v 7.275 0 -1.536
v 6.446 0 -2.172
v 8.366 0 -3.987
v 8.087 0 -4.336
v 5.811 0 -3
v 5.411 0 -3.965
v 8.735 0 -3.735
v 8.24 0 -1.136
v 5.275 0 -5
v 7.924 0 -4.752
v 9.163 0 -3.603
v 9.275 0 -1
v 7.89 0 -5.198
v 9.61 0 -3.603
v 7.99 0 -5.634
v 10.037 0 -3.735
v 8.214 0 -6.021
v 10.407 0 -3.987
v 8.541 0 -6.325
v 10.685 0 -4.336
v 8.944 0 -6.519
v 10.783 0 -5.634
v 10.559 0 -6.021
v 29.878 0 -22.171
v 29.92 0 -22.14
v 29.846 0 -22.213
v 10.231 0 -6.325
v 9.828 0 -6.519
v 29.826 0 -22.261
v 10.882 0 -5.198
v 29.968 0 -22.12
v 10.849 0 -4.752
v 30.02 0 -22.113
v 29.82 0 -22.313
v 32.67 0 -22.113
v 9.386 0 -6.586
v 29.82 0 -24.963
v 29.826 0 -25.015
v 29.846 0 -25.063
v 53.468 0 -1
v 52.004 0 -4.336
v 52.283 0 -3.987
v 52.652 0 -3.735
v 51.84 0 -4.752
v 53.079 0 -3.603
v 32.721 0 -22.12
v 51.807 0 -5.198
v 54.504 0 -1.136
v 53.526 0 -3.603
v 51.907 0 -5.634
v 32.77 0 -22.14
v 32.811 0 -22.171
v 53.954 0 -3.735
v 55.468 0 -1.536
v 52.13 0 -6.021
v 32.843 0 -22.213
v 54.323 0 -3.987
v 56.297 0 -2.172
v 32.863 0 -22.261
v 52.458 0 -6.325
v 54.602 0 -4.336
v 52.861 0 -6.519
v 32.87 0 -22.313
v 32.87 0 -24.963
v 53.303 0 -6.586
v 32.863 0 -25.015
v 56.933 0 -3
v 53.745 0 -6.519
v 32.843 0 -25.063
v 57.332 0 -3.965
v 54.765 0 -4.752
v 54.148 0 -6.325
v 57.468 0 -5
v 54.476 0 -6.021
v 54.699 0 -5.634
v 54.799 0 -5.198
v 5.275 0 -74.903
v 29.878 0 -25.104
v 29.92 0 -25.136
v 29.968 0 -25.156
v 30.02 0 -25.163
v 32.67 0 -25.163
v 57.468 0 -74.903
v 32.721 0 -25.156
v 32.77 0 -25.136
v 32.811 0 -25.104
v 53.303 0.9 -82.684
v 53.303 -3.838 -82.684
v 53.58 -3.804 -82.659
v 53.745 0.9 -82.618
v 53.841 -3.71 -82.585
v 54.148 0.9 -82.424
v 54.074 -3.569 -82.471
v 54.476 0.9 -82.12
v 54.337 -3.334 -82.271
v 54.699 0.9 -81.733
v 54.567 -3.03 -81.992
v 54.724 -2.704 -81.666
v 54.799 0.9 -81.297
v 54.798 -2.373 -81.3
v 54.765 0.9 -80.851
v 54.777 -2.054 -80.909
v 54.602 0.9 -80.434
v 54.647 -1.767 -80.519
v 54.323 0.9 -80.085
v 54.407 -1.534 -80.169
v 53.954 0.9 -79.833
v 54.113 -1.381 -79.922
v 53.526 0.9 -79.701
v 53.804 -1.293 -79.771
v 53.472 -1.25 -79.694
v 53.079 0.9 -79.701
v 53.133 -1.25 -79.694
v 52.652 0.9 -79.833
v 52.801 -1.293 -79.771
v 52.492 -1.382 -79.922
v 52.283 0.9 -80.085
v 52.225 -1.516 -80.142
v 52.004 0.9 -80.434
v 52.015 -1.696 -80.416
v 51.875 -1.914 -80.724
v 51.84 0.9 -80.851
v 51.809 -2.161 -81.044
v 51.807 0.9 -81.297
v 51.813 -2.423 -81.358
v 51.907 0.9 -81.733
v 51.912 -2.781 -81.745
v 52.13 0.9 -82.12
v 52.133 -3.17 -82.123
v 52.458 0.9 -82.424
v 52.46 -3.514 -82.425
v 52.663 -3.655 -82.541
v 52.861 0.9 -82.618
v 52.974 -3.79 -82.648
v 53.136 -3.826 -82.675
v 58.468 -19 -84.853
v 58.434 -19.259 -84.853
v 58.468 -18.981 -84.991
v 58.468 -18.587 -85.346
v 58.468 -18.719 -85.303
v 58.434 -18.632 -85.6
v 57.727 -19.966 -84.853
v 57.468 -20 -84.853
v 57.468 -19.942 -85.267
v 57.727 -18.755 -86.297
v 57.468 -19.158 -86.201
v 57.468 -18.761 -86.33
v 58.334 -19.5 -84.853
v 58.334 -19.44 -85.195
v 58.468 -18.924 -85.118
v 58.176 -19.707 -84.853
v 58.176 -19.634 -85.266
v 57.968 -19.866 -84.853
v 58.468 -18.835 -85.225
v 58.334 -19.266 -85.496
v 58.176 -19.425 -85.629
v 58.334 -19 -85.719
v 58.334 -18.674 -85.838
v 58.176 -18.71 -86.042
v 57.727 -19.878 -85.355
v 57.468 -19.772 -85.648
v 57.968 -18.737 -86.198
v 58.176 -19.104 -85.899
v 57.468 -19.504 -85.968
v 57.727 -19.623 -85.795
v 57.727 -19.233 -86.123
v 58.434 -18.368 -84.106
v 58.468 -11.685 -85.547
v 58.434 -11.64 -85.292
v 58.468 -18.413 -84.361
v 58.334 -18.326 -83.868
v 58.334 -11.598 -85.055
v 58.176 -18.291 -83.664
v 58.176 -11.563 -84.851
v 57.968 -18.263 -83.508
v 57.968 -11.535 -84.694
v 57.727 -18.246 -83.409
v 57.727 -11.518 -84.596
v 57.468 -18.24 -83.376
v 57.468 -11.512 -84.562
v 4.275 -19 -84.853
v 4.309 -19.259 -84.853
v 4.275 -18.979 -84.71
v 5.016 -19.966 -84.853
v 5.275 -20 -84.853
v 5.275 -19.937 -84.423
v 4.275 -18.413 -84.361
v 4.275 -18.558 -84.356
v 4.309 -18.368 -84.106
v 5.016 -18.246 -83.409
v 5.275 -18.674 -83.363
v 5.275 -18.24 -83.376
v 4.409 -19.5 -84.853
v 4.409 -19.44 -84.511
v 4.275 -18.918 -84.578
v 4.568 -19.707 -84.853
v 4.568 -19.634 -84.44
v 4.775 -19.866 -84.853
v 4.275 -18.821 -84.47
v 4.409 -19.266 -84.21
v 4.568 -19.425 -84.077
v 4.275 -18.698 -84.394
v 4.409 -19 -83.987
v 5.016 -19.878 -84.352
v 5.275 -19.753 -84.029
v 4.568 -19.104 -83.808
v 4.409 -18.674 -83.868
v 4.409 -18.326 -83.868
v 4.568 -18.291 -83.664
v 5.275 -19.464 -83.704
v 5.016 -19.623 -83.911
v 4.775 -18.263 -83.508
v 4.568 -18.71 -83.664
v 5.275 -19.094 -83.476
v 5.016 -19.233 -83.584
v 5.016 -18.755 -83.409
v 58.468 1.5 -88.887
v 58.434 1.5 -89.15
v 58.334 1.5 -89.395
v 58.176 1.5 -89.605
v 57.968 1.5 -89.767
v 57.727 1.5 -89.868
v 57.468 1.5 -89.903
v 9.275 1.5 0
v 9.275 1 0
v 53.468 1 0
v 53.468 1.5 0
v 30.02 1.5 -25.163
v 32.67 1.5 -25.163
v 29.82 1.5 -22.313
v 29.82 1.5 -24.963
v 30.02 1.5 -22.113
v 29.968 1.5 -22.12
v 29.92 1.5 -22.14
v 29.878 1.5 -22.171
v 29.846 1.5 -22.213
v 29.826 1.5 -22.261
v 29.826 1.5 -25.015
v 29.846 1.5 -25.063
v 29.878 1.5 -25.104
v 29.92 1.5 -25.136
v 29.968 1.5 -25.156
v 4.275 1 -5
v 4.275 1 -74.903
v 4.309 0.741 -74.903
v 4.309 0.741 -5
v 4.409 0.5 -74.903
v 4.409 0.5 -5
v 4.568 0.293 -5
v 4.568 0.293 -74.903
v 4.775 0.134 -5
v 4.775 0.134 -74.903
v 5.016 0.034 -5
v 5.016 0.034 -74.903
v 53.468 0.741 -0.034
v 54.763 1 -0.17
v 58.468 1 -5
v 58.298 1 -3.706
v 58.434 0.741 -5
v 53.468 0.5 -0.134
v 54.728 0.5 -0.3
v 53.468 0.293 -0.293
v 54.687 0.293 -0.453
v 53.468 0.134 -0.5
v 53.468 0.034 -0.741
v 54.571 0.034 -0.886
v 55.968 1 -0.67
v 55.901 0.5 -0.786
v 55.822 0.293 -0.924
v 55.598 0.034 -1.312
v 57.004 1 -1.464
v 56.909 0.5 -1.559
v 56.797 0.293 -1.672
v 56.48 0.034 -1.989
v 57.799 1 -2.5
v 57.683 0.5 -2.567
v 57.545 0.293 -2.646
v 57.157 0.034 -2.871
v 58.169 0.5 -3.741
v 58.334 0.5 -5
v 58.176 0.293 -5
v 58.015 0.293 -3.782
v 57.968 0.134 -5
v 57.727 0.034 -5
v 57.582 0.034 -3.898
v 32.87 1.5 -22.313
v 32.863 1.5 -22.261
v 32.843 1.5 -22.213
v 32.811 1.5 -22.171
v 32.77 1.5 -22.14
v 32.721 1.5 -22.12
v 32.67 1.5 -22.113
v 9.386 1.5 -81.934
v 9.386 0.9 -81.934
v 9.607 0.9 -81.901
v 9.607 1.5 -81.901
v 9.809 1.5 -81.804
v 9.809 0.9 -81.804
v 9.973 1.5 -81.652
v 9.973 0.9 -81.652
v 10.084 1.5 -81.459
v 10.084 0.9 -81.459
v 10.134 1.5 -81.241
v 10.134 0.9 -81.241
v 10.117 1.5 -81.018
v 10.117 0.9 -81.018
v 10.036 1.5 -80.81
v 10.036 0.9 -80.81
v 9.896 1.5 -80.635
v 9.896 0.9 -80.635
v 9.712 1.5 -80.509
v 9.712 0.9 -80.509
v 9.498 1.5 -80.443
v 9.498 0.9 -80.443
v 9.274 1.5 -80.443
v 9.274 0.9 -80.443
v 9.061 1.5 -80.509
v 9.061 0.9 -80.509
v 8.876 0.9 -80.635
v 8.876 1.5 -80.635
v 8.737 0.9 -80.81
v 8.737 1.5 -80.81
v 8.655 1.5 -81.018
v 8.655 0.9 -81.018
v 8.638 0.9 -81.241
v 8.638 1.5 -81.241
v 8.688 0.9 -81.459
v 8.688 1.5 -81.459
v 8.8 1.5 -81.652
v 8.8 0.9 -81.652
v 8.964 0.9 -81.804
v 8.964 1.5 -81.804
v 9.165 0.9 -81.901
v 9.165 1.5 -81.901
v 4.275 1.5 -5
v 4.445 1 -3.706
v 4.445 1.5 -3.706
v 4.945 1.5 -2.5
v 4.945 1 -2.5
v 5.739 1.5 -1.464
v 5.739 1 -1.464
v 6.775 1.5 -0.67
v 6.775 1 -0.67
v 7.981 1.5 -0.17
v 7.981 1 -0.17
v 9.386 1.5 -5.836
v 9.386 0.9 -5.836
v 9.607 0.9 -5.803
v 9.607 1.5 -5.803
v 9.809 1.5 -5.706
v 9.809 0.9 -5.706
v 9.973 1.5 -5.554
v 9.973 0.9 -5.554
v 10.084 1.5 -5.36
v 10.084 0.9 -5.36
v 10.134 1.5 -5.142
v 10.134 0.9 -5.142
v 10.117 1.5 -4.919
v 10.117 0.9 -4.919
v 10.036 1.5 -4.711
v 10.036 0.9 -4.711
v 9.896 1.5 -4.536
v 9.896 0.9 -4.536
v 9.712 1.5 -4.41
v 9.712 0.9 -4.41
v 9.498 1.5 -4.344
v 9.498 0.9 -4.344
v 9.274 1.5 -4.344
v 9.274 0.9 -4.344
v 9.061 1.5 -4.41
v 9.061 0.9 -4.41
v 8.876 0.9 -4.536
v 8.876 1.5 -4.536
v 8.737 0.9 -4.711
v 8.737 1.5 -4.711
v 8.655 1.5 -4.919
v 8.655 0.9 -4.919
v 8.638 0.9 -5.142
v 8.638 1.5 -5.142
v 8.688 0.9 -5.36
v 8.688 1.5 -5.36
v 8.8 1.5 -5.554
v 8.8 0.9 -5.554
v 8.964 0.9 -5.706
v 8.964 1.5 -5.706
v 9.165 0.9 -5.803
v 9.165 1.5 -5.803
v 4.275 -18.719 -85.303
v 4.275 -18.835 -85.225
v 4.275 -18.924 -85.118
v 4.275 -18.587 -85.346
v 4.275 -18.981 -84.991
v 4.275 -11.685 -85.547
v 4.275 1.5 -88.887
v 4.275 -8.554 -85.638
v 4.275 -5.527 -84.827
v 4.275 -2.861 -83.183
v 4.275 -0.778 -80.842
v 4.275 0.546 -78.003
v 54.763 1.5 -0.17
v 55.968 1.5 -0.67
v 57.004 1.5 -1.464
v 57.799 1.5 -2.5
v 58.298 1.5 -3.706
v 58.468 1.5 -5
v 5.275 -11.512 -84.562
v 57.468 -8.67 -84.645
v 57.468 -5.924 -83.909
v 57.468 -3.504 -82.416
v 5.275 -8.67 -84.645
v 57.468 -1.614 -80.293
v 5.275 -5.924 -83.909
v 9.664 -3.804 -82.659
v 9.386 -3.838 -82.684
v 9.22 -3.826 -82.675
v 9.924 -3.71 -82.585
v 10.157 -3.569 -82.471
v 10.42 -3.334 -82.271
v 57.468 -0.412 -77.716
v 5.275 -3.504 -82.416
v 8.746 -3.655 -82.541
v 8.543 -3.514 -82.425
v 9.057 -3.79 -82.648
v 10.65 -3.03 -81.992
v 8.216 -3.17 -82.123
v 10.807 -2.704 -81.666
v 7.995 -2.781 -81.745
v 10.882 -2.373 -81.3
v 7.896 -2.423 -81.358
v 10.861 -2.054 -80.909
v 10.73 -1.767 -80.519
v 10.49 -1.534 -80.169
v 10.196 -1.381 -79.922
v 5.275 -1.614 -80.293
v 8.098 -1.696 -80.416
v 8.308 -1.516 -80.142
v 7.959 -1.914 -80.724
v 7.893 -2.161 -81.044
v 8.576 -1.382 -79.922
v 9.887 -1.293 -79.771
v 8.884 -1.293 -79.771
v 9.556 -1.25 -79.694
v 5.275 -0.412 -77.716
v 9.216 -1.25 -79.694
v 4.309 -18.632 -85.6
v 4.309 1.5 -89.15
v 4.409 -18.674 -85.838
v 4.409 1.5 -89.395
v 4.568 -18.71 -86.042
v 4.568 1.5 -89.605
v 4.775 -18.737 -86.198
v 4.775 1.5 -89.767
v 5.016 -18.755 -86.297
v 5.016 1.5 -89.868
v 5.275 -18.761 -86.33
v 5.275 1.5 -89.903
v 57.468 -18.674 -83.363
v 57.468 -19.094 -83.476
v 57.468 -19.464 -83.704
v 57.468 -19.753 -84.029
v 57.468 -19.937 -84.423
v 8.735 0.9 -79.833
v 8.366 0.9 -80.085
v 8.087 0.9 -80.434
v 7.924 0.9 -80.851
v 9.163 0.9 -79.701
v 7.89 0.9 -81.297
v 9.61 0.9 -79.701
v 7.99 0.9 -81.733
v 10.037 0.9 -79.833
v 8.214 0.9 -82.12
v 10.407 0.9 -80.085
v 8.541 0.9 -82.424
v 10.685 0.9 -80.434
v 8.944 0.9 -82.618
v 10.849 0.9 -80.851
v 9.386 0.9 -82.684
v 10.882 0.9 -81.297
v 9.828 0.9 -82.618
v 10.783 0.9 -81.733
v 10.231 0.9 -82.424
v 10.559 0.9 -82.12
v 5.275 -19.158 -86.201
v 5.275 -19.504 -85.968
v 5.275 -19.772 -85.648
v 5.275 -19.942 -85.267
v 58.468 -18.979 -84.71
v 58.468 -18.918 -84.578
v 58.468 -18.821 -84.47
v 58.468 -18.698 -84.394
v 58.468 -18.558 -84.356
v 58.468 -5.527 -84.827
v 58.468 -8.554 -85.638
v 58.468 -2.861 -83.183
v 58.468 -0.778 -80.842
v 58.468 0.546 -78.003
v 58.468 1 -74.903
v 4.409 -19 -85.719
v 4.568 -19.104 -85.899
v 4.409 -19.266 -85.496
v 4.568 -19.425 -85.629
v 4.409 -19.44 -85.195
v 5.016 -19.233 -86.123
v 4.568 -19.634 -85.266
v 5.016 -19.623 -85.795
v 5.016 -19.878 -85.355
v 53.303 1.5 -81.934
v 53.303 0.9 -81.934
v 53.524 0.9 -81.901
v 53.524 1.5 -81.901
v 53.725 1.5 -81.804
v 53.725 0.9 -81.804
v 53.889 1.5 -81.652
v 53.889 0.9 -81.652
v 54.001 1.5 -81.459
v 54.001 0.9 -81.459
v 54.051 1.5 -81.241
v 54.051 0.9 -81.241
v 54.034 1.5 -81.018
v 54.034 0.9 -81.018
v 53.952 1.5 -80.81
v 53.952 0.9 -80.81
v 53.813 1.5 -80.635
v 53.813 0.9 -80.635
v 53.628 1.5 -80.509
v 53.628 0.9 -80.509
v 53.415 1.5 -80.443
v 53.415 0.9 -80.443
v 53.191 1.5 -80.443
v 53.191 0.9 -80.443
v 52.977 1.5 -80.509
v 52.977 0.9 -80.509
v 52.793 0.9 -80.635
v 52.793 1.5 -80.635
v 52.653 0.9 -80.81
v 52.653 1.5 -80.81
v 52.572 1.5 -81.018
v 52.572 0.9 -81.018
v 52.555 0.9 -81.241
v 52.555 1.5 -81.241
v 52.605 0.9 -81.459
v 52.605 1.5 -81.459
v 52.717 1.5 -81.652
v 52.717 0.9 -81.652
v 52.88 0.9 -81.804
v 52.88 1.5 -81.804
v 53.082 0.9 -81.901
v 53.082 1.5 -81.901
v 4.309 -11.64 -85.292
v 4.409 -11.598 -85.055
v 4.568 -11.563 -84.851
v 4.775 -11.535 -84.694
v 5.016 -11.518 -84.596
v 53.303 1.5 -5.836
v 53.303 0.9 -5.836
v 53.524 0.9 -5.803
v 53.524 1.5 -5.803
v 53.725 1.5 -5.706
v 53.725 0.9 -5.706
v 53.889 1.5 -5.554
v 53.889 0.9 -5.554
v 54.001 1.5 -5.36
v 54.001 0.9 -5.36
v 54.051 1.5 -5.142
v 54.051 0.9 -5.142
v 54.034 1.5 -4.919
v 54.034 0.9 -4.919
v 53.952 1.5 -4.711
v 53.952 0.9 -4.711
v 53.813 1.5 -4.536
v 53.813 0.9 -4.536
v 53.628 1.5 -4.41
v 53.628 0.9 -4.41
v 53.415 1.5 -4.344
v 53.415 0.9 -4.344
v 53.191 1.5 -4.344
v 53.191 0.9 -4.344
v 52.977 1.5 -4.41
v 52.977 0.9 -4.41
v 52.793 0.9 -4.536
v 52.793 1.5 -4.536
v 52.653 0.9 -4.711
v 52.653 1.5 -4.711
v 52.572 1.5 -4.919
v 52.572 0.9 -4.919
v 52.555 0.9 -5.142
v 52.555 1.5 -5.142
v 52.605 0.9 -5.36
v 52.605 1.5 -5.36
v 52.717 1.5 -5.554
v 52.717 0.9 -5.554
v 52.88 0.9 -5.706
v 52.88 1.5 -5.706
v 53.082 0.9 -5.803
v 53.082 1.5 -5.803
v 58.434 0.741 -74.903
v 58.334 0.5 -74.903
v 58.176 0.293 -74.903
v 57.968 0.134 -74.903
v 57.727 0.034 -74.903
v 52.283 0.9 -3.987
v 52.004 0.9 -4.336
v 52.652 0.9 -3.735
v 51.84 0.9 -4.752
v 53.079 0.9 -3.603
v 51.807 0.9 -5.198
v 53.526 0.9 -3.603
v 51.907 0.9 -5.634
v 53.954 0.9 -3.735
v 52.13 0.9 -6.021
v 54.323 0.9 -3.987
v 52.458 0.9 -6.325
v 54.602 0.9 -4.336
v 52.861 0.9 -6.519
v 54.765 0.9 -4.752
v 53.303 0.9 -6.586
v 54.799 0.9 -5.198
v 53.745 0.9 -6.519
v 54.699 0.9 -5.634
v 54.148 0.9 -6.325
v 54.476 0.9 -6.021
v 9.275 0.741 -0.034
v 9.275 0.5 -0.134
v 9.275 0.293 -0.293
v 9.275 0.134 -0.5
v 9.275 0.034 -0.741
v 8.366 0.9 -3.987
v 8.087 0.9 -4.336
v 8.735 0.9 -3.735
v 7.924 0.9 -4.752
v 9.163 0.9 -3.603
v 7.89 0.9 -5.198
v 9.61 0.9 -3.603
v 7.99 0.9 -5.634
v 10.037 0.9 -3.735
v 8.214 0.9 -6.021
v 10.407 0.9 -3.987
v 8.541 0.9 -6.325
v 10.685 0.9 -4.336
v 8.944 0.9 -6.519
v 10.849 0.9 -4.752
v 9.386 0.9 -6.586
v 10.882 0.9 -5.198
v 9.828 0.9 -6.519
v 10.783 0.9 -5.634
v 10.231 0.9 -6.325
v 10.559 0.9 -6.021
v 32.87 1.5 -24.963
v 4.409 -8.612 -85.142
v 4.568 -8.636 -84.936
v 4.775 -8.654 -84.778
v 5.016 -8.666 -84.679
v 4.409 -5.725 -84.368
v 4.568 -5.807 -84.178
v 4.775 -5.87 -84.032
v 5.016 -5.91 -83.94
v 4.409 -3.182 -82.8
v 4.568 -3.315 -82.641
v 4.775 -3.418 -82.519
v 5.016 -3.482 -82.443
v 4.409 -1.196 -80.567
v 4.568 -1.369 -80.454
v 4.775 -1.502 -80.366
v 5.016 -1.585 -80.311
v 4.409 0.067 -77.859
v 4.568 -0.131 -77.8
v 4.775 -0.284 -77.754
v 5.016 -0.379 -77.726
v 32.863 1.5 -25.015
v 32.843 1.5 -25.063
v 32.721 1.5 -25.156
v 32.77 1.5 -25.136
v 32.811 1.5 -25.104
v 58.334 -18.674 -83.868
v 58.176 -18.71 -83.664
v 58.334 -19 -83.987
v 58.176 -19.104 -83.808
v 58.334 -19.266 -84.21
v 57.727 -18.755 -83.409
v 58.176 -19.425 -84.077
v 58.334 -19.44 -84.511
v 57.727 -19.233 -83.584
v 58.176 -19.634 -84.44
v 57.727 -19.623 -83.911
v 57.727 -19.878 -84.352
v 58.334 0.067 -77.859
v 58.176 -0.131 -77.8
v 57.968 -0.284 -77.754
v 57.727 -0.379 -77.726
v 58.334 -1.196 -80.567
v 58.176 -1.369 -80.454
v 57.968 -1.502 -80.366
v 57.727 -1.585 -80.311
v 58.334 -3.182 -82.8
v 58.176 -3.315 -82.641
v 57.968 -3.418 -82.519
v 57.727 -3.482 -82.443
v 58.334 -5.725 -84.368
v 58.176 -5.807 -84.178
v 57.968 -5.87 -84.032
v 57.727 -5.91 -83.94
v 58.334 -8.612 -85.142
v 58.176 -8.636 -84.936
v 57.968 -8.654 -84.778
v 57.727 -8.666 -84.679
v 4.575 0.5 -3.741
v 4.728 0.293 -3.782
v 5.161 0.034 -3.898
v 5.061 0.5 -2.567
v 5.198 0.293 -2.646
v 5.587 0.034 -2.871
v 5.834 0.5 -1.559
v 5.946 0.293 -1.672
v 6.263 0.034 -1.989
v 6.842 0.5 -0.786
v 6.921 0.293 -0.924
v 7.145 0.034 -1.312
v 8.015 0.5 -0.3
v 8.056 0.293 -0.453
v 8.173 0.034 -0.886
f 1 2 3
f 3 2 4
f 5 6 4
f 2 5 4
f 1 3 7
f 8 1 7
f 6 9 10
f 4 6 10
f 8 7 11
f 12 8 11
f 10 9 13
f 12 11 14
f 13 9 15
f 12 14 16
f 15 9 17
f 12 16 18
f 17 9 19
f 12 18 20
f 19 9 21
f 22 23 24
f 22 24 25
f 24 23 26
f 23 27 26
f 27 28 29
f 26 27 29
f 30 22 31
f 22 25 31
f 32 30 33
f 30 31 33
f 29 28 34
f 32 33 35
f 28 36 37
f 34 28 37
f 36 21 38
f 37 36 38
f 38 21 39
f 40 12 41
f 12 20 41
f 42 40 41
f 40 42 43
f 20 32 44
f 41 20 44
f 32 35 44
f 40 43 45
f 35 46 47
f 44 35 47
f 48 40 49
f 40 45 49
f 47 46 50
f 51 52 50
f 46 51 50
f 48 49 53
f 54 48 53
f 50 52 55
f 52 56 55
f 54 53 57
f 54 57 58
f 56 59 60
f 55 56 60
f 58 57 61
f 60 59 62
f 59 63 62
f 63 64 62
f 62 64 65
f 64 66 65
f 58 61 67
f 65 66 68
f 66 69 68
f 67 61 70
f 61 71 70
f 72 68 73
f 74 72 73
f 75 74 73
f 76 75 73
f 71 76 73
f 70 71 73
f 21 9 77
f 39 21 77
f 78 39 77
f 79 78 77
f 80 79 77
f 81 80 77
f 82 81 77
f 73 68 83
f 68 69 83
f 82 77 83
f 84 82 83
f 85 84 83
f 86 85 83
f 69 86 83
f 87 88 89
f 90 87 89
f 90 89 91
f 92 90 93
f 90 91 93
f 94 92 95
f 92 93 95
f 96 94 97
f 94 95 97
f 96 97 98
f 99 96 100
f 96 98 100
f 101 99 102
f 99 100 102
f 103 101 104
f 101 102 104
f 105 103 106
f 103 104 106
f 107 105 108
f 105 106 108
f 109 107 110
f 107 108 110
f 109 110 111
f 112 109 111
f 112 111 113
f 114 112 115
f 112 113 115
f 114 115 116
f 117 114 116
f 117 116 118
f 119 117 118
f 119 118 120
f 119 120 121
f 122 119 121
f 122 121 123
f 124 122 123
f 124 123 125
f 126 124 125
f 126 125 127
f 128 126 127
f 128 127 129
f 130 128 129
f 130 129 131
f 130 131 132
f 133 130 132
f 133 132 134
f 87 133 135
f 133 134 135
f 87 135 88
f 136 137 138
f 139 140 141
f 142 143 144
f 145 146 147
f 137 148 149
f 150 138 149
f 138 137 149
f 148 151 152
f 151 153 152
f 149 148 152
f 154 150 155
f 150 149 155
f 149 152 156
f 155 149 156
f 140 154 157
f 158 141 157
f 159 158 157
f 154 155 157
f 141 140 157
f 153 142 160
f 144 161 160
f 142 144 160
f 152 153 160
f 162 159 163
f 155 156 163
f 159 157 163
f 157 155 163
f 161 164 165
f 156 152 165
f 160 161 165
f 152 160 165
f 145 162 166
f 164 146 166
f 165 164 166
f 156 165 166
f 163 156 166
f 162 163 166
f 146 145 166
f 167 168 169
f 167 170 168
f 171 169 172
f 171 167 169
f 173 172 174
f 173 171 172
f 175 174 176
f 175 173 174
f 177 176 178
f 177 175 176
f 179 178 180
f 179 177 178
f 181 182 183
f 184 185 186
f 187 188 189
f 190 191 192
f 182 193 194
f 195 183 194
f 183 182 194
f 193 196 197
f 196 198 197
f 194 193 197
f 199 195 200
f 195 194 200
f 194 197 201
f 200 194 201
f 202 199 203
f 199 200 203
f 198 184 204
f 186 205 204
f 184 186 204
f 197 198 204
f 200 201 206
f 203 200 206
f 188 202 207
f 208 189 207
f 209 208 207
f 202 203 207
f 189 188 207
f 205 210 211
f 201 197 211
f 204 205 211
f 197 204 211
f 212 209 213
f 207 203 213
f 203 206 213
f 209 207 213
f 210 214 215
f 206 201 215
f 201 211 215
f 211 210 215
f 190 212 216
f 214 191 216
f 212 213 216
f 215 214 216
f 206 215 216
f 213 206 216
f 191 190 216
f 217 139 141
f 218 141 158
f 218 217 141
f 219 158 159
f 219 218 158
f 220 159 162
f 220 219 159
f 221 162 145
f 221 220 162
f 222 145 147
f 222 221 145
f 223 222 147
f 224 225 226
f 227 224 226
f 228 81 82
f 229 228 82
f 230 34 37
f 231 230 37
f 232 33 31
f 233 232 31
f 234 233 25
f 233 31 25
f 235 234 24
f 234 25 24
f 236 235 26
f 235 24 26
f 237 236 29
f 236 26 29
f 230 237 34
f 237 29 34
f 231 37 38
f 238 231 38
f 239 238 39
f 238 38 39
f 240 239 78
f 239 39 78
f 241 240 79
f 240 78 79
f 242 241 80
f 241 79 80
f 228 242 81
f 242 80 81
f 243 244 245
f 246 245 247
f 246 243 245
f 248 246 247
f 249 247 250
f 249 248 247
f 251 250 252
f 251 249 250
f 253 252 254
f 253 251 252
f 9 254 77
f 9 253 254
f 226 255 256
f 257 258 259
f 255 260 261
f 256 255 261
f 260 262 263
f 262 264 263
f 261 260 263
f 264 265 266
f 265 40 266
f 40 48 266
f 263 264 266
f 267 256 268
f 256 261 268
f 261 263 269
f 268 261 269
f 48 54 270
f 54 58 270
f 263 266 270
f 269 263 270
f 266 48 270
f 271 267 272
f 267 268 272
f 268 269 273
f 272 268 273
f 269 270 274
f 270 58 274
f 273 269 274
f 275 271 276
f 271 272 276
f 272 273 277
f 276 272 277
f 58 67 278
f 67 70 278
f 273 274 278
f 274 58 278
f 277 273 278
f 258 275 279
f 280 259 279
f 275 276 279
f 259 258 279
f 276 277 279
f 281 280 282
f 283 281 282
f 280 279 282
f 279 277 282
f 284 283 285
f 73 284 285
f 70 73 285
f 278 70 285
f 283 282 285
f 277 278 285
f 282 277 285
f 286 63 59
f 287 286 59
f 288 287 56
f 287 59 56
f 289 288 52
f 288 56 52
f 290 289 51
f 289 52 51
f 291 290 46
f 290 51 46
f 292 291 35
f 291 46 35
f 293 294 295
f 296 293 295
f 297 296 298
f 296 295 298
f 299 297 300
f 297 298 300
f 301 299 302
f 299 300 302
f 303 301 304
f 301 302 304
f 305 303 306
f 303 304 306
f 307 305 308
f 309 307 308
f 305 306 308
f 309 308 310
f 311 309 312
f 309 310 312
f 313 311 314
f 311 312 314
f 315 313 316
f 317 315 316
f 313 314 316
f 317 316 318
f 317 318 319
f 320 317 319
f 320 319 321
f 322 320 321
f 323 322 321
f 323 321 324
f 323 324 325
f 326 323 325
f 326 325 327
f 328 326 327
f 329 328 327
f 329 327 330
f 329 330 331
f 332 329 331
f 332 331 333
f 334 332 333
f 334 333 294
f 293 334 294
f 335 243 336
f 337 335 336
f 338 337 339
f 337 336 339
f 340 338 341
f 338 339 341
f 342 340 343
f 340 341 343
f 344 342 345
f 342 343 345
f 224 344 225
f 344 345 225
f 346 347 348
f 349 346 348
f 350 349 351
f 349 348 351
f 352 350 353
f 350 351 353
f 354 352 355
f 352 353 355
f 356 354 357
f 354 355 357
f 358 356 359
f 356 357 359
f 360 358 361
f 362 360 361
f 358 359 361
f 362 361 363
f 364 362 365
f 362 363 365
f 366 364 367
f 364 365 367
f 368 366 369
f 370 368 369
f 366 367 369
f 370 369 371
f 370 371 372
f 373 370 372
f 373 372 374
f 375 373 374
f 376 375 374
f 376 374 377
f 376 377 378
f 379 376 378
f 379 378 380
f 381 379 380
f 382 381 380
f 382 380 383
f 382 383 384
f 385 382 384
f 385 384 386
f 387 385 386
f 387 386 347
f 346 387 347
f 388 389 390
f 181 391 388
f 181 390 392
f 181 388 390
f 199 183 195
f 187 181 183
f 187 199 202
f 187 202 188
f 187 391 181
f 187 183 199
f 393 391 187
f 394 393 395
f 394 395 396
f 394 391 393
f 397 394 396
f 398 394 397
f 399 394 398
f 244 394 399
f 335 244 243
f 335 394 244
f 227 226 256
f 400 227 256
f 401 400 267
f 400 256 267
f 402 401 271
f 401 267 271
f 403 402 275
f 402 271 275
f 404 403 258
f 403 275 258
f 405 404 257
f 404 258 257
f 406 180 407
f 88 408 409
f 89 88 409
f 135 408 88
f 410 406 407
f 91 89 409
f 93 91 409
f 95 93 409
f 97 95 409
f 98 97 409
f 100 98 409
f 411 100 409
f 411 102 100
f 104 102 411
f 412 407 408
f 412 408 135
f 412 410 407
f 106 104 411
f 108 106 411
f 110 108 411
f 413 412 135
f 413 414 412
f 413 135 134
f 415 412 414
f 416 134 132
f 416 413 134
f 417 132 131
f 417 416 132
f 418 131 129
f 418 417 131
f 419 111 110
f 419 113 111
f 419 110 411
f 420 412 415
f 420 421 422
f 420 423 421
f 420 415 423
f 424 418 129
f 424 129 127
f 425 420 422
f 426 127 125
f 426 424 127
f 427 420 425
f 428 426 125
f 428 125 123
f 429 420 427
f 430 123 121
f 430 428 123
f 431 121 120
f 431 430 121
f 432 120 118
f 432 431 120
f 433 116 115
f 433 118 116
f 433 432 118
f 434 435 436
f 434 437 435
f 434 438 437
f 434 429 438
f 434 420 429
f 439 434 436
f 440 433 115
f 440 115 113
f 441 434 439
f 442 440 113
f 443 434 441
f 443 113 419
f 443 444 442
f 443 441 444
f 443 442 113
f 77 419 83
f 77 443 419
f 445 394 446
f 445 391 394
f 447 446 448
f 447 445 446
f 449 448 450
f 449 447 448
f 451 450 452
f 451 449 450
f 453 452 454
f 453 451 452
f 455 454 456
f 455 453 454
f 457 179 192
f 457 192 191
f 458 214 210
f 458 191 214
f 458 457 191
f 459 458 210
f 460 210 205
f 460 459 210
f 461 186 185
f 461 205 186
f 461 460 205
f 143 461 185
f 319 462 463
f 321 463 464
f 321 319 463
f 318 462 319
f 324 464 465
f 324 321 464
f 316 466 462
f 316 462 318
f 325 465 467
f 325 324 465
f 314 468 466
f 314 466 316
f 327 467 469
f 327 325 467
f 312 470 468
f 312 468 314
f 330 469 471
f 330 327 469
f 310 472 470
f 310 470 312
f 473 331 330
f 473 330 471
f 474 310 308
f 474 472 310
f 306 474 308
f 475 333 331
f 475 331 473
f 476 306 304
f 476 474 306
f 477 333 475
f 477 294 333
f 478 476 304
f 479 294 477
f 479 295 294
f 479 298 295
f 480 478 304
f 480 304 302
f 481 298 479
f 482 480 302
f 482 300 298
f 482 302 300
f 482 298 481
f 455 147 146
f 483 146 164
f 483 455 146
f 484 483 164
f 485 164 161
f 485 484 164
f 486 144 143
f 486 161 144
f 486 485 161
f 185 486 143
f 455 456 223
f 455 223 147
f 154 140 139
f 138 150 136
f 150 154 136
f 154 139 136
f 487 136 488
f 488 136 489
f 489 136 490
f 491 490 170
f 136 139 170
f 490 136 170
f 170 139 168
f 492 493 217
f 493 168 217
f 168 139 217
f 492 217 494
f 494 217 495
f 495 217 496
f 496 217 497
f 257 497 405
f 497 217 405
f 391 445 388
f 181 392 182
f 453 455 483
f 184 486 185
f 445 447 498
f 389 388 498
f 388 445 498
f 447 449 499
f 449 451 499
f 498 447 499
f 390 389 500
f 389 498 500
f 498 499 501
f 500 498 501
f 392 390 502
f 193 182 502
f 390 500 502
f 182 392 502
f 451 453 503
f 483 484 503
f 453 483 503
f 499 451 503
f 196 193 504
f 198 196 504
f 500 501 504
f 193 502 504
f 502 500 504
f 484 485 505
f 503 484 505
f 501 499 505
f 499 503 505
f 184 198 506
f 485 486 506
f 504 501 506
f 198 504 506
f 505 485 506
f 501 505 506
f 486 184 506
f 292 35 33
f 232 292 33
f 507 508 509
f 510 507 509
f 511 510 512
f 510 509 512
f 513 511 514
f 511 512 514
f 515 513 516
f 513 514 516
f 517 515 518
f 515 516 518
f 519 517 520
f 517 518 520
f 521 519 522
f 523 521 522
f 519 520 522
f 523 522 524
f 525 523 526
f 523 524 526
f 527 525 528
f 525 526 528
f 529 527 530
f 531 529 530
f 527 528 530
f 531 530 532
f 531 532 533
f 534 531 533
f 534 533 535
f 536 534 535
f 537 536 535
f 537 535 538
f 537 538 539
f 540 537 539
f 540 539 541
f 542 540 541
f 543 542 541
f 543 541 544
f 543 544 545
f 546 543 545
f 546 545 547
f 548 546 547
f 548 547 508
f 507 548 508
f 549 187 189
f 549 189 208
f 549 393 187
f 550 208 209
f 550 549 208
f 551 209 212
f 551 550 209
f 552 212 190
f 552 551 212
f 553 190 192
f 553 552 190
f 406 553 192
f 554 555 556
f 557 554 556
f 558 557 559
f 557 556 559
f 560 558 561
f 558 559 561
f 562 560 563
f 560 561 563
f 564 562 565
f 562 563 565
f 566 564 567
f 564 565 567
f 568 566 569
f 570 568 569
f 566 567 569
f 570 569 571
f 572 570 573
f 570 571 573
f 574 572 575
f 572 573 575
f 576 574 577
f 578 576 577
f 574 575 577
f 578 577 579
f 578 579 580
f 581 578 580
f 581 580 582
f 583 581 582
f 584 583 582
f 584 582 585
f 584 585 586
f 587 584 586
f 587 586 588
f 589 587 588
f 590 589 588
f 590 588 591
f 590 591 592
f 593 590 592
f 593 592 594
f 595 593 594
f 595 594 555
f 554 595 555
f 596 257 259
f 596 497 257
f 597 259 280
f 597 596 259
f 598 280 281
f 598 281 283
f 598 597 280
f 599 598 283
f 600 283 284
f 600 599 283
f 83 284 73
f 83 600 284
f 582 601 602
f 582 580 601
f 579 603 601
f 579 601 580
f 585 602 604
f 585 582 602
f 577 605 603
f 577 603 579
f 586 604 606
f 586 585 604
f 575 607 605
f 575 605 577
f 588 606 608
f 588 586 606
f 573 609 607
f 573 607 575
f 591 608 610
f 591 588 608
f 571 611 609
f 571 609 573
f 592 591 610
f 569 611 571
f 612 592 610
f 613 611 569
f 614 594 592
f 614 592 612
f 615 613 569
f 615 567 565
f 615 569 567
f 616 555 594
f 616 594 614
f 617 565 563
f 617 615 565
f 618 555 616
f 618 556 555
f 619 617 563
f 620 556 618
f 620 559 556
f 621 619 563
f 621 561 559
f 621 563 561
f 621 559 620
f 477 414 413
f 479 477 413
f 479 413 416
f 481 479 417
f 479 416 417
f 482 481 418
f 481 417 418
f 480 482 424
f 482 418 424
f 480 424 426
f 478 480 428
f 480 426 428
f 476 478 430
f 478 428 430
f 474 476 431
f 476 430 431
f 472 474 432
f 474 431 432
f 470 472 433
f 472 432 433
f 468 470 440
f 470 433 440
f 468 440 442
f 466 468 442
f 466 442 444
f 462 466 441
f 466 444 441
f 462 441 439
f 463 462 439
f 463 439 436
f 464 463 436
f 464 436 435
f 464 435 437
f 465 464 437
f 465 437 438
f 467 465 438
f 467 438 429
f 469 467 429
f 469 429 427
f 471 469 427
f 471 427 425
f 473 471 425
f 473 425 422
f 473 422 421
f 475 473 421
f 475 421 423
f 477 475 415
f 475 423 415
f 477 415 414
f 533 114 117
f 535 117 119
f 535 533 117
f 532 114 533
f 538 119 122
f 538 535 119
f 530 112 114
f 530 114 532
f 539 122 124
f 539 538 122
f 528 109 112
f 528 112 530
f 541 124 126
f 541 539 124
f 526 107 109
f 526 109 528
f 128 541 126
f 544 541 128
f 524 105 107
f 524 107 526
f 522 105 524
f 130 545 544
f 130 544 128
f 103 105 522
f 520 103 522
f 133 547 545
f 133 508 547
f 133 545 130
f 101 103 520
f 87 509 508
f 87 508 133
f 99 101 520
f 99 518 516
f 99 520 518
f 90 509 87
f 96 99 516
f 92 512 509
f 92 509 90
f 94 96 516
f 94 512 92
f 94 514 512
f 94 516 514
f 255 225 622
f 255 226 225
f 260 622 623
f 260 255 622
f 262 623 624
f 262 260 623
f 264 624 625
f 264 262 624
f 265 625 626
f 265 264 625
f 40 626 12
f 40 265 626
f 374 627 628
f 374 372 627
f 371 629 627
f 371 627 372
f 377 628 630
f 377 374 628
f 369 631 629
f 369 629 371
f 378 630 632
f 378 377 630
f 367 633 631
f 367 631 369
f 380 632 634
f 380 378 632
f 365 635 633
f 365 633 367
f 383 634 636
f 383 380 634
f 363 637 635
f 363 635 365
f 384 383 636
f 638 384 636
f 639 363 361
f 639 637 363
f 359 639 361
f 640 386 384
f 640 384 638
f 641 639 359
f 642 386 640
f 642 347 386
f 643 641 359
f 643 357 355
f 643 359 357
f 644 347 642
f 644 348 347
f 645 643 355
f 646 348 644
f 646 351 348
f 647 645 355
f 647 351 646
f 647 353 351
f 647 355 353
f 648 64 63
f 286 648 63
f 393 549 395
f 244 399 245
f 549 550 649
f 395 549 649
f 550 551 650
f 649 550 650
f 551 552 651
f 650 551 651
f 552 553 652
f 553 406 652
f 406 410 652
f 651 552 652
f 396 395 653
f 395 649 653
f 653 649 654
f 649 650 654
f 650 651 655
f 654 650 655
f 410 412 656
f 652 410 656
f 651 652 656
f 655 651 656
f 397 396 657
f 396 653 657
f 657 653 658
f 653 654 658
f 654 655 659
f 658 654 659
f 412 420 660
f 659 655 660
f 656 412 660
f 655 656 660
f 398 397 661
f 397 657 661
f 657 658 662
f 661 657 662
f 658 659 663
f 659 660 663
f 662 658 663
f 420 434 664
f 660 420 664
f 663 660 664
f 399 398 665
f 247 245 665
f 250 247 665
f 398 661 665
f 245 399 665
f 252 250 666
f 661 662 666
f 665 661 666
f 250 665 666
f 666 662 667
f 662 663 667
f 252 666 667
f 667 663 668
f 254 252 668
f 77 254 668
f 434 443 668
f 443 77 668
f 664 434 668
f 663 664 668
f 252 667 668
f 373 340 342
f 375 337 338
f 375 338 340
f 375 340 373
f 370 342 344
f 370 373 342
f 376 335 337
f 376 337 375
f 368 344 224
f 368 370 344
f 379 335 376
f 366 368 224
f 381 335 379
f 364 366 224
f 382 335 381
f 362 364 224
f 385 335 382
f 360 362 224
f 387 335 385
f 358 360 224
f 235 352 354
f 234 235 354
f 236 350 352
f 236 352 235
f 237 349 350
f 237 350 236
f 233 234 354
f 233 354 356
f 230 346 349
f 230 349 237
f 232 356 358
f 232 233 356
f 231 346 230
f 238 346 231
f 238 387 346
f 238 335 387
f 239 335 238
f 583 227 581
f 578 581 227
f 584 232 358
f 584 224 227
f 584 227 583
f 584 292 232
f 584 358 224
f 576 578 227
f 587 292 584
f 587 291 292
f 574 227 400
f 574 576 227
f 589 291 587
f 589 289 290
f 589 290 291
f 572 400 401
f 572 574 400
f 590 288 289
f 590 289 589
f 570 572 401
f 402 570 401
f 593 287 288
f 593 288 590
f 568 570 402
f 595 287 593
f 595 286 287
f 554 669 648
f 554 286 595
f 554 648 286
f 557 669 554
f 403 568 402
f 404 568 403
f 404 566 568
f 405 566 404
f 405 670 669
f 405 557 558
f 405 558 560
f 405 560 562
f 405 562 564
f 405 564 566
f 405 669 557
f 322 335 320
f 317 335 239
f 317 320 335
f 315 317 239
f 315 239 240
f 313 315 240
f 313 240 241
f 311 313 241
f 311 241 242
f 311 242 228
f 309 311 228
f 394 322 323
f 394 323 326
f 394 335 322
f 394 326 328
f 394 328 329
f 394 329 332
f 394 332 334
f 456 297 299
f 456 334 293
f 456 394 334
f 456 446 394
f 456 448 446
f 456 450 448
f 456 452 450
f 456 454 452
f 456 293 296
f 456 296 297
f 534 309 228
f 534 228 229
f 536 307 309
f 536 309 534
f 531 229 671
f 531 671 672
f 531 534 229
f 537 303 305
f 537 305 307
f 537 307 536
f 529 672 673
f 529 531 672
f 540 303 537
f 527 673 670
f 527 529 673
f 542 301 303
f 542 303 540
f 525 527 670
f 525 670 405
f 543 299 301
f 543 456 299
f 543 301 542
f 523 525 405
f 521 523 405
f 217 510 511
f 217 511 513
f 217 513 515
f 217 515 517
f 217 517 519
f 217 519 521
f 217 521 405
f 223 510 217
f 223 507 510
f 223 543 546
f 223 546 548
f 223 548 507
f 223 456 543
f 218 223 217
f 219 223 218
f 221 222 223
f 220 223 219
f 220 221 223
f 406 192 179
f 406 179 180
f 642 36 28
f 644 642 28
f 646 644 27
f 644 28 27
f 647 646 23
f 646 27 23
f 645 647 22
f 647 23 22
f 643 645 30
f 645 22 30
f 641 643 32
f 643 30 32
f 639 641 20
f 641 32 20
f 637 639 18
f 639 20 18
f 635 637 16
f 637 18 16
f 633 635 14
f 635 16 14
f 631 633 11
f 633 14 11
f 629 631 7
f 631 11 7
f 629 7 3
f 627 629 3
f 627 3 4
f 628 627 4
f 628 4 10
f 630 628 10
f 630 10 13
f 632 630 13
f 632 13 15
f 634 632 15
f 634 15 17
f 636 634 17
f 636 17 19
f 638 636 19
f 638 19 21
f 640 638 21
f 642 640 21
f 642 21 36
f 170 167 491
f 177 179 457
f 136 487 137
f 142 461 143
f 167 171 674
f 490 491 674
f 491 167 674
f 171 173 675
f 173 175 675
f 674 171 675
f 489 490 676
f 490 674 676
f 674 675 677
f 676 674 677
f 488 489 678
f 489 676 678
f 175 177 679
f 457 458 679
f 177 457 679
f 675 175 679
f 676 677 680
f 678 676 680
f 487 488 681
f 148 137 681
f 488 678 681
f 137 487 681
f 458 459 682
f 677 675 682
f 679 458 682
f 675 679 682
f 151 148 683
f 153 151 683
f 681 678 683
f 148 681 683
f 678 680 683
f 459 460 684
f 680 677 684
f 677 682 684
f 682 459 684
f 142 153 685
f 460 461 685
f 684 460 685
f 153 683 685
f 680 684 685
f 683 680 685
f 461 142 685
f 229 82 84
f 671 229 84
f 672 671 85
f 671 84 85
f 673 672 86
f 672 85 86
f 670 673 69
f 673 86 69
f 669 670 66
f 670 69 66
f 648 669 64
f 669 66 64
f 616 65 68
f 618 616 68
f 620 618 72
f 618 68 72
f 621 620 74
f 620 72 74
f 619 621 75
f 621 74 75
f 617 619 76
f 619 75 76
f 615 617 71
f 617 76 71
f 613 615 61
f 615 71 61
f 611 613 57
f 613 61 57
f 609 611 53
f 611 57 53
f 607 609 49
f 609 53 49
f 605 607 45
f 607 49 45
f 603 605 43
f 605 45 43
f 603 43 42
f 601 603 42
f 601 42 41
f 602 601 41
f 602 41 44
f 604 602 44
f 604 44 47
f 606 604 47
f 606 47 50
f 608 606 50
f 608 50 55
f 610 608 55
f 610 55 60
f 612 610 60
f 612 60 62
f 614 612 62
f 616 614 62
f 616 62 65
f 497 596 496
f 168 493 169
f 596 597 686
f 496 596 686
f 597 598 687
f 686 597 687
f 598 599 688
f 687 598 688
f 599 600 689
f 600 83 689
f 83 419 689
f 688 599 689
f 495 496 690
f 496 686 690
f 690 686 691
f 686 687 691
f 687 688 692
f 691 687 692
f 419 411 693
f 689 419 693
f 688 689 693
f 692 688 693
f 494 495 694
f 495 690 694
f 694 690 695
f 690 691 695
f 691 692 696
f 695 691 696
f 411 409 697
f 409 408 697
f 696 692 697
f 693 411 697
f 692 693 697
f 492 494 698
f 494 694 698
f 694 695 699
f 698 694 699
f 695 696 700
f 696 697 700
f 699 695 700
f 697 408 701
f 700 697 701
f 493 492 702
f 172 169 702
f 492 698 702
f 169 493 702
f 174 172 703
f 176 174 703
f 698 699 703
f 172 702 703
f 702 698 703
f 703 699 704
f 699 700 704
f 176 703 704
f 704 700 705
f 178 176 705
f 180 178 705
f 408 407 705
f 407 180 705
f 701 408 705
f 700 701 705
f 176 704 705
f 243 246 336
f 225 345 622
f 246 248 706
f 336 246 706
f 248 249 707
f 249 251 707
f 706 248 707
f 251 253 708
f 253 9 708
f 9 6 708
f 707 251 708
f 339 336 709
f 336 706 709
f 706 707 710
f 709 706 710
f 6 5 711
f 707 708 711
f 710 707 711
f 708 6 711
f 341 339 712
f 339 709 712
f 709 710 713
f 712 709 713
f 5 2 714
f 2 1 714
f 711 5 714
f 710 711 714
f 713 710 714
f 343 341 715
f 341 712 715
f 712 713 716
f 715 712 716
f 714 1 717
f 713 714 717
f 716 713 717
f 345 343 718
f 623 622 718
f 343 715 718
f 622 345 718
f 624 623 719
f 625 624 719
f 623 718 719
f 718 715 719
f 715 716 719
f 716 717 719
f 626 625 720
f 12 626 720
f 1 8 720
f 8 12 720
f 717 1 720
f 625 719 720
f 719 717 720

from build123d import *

# Parameters (mm, degrees)
BOSS_EXTRUDE1_DEPTH = 1.5
SKETCH3_W           = 54.19363593
SKETCH3_H           = 15
BOSS_EXTRUDE2_DEPTH = 20
CUT_EXTRUDE2_DEPTH  = 107.861890415
CUT_EXTRUDE4_DEPTH  = 107.861890415
FILLET1_R           = 1.5
SKETCH7_R           = 0.75
CUT_EXTRUDE5_DEPTH  = 109.286974912
SKETCH9_R           = 1.5
CUT_EXTRUDE6_DEPTH  = 5.9
FILLET2_R           = 1
CUT_EXTRUDE7_DEPTH  = 110.092020548


with BuildPart() as part:
    # Sketch1 → Boss-Extrude1 (new body)
    with BuildSketch(Plane(origin=(0, 0, 0), x_dir=(1, 0, 0), z_dir=(0, 1, 0))):
        with BuildLine():
            Line((9.274778516, 0), (53.468414446, 0))
            ThreePointArc((53.468414446, 0), (57.003948352, 1.464466094), (58.468414446, 5))
            Line((58.468414446, 5), (58.468414446, 89.9028))
            Line((58.468414446, 89.9028), (4.274778516, 89.9028))
            Line((4.274778516, 89.9028), (4.274778516, 5))
            ThreePointArc((4.274778516, 5), (5.73924461, 1.464466094), (9.274778516, 0))
        make_face()
    extrude(amount=BOSS_EXTRUDE1_DEPTH)

    # Sketch3 → Boss-Extrude2 (add)
    with BuildSketch(Plane.XZ):
        with Locations((31.371596481, -82.4028)):
            Rectangle(SKETCH3_W, SKETCH3_H)
    extrude(amount=BOSS_EXTRUDE2_DEPTH)

    # Sketch2 → Cut-Extrude2 (cut, through all)
    with BuildSketch(Plane(origin=(58.468414446, 0, 0), x_dir=(0, 0, -1), z_dir=(1, 0, 0))):
        Polygon((89.9028, 1.5), (86.111769915, -20), (89.9028, -20), align=None)
    extrude(amount=-CUT_EXTRUDE2_DEPTH, mode=Mode.SUBTRACT)

    # Sketch4 → Cut-Extrude4 (cut, through all)
    with BuildSketch(Plane.ZY.offset(-4.274778516)):
        with BuildLine():
            Line((-74.9028, 0), (-74.9028, -20))
            Line((-74.9028, -20), (-83.065490079, -20))
            Line((-83.065490079, -20), (-84.562216259, -11.511644029))
            ThreePointArc((-84.562216259, -11.511644029), (-82.416492014, -3.503692127), (-74.9028, 0))
        make_face()
    extrude(amount=-CUT_EXTRUDE4_DEPTH, mode=Mode.SUBTRACT)

    # Fillet1
    fillet1_edges = [part.edges().sort_by_distance(p)[0] for p in [
        (31.371596481, -20, -86.111769915),
        (31.371596481, -20, -83.065490079),
    ]]
    fillet(fillet1_edges, radius=FILLET1_R - 0.0001)  # a hair under: the kernel refuses the full size

    # Sketch7 → Cut-Extrude5 (cut, through all)
    with BuildSketch(Plane(origin=(0, -5, 0), x_dir=(-1, 0, 0), z_dir=(0, -1, 0))):
        with Locations(Location((-53.302878516, 5.0861, 0), (0, 0, 90))):
            Circle(SKETCH7_R)
        with Locations(Location((-9.386278516, 5.0861, 0), (0, 0, 90))):
            Circle(SKETCH7_R)
        with Locations(Location((-9.386278516, 81.1845, 0), (0, 0, 90))):
            Circle(SKETCH7_R)
        with Locations(Location((-53.302878516, 81.1845, 0), (0, 0, 90))):
            Circle(SKETCH7_R)
    extrude(amount=-CUT_EXTRUDE5_DEPTH, mode=Mode.SUBTRACT)

    # Sketch9 → Cut-Extrude6 (cut)
    with BuildSketch(Plane(origin=(0, -5, 0), x_dir=(-1, 0, 0), z_dir=(0, -1, 0))):
        with Locations(Location((-53.302878516, 5.0861, 0), (0, 0, 90))):
            Circle(SKETCH9_R)
        with Locations(Location((-9.386278516, 5.0861, 0), (0, 0, 90))):
            Circle(SKETCH9_R)
        with Locations(Location((-9.386278516, 81.1845, 0), (0, 0, 90))):
            Circle(SKETCH9_R)
        with Locations(Location((-53.302878516, 81.1845, 0), (0, 0, 90))):
            Circle(SKETCH9_R)
    extrude(amount=-CUT_EXTRUDE6_DEPTH, mode=Mode.SUBTRACT)

    # Fillet2
    fillet2_edges = [part.edges().sort_by_distance(p)[0] for p in [
        (4.274778516, 0, -39.9514),
        (4.274778516, -8.630277451, -88.116558763),
        (58.468414446, -8.630277451, -88.116558763),
        (58.468414446, -3.503692127, -82.416492014),
        (58.468414446, -14.875644564, -83.969052201),
        (4.274778516, -3.503692127, -82.416492014),
        (4.274778516, -14.875644564, -83.969052201),
        (58.468414446, -19.464217136, -83.704011232),
        (58.468414446, -19.64909006, -85.817321514),
        (4.274778516, -19.464217136, -83.704011232),
        (4.274778516, -19.64909006, -85.817321514),
        (57.003948352, 0, -1.464466094),
        (31.371596481, 0, 0),
        (5.73924461, 0, -1.464466094),
        (58.468414446, 0, -39.9514),
    ]]
    fillet(fillet2_edges, radius=FILLET2_R)

    # Sketch10 → Cut-Extrude7 (cut, through all)
    with BuildSketch(Plane.XZ):
        with BuildLine():
            Line((32.669578516, -22.1128), (30.019578516, -22.1128))
            ThreePointArc((30.019578516, -22.1128), (29.87815716, -22.171378644), (29.819578516, -22.3128))
            Line((29.819578516, -22.3128), (29.819578516, -24.9628))
            ThreePointArc((29.819578516, -24.9628), (29.87815716, -25.104221356), (30.019578516, -25.1628))
            Line((30.019578516, -25.1628), (32.669578516, -25.1628))
            ThreePointArc((32.669578516, -25.1628), (32.810999872, -25.104221356), (32.869578516, -24.9628))
            Line((32.869578516, -24.9628), (32.869578516, -22.3128))
            ThreePointArc((32.869578516, -22.3128), (32.810999872, -22.171378644), (32.669578516, -22.1128))
        make_face()
    extrude(amount=-CUT_EXTRUDE7_DEPTH, mode=Mode.SUBTRACT)


solid = part.part
